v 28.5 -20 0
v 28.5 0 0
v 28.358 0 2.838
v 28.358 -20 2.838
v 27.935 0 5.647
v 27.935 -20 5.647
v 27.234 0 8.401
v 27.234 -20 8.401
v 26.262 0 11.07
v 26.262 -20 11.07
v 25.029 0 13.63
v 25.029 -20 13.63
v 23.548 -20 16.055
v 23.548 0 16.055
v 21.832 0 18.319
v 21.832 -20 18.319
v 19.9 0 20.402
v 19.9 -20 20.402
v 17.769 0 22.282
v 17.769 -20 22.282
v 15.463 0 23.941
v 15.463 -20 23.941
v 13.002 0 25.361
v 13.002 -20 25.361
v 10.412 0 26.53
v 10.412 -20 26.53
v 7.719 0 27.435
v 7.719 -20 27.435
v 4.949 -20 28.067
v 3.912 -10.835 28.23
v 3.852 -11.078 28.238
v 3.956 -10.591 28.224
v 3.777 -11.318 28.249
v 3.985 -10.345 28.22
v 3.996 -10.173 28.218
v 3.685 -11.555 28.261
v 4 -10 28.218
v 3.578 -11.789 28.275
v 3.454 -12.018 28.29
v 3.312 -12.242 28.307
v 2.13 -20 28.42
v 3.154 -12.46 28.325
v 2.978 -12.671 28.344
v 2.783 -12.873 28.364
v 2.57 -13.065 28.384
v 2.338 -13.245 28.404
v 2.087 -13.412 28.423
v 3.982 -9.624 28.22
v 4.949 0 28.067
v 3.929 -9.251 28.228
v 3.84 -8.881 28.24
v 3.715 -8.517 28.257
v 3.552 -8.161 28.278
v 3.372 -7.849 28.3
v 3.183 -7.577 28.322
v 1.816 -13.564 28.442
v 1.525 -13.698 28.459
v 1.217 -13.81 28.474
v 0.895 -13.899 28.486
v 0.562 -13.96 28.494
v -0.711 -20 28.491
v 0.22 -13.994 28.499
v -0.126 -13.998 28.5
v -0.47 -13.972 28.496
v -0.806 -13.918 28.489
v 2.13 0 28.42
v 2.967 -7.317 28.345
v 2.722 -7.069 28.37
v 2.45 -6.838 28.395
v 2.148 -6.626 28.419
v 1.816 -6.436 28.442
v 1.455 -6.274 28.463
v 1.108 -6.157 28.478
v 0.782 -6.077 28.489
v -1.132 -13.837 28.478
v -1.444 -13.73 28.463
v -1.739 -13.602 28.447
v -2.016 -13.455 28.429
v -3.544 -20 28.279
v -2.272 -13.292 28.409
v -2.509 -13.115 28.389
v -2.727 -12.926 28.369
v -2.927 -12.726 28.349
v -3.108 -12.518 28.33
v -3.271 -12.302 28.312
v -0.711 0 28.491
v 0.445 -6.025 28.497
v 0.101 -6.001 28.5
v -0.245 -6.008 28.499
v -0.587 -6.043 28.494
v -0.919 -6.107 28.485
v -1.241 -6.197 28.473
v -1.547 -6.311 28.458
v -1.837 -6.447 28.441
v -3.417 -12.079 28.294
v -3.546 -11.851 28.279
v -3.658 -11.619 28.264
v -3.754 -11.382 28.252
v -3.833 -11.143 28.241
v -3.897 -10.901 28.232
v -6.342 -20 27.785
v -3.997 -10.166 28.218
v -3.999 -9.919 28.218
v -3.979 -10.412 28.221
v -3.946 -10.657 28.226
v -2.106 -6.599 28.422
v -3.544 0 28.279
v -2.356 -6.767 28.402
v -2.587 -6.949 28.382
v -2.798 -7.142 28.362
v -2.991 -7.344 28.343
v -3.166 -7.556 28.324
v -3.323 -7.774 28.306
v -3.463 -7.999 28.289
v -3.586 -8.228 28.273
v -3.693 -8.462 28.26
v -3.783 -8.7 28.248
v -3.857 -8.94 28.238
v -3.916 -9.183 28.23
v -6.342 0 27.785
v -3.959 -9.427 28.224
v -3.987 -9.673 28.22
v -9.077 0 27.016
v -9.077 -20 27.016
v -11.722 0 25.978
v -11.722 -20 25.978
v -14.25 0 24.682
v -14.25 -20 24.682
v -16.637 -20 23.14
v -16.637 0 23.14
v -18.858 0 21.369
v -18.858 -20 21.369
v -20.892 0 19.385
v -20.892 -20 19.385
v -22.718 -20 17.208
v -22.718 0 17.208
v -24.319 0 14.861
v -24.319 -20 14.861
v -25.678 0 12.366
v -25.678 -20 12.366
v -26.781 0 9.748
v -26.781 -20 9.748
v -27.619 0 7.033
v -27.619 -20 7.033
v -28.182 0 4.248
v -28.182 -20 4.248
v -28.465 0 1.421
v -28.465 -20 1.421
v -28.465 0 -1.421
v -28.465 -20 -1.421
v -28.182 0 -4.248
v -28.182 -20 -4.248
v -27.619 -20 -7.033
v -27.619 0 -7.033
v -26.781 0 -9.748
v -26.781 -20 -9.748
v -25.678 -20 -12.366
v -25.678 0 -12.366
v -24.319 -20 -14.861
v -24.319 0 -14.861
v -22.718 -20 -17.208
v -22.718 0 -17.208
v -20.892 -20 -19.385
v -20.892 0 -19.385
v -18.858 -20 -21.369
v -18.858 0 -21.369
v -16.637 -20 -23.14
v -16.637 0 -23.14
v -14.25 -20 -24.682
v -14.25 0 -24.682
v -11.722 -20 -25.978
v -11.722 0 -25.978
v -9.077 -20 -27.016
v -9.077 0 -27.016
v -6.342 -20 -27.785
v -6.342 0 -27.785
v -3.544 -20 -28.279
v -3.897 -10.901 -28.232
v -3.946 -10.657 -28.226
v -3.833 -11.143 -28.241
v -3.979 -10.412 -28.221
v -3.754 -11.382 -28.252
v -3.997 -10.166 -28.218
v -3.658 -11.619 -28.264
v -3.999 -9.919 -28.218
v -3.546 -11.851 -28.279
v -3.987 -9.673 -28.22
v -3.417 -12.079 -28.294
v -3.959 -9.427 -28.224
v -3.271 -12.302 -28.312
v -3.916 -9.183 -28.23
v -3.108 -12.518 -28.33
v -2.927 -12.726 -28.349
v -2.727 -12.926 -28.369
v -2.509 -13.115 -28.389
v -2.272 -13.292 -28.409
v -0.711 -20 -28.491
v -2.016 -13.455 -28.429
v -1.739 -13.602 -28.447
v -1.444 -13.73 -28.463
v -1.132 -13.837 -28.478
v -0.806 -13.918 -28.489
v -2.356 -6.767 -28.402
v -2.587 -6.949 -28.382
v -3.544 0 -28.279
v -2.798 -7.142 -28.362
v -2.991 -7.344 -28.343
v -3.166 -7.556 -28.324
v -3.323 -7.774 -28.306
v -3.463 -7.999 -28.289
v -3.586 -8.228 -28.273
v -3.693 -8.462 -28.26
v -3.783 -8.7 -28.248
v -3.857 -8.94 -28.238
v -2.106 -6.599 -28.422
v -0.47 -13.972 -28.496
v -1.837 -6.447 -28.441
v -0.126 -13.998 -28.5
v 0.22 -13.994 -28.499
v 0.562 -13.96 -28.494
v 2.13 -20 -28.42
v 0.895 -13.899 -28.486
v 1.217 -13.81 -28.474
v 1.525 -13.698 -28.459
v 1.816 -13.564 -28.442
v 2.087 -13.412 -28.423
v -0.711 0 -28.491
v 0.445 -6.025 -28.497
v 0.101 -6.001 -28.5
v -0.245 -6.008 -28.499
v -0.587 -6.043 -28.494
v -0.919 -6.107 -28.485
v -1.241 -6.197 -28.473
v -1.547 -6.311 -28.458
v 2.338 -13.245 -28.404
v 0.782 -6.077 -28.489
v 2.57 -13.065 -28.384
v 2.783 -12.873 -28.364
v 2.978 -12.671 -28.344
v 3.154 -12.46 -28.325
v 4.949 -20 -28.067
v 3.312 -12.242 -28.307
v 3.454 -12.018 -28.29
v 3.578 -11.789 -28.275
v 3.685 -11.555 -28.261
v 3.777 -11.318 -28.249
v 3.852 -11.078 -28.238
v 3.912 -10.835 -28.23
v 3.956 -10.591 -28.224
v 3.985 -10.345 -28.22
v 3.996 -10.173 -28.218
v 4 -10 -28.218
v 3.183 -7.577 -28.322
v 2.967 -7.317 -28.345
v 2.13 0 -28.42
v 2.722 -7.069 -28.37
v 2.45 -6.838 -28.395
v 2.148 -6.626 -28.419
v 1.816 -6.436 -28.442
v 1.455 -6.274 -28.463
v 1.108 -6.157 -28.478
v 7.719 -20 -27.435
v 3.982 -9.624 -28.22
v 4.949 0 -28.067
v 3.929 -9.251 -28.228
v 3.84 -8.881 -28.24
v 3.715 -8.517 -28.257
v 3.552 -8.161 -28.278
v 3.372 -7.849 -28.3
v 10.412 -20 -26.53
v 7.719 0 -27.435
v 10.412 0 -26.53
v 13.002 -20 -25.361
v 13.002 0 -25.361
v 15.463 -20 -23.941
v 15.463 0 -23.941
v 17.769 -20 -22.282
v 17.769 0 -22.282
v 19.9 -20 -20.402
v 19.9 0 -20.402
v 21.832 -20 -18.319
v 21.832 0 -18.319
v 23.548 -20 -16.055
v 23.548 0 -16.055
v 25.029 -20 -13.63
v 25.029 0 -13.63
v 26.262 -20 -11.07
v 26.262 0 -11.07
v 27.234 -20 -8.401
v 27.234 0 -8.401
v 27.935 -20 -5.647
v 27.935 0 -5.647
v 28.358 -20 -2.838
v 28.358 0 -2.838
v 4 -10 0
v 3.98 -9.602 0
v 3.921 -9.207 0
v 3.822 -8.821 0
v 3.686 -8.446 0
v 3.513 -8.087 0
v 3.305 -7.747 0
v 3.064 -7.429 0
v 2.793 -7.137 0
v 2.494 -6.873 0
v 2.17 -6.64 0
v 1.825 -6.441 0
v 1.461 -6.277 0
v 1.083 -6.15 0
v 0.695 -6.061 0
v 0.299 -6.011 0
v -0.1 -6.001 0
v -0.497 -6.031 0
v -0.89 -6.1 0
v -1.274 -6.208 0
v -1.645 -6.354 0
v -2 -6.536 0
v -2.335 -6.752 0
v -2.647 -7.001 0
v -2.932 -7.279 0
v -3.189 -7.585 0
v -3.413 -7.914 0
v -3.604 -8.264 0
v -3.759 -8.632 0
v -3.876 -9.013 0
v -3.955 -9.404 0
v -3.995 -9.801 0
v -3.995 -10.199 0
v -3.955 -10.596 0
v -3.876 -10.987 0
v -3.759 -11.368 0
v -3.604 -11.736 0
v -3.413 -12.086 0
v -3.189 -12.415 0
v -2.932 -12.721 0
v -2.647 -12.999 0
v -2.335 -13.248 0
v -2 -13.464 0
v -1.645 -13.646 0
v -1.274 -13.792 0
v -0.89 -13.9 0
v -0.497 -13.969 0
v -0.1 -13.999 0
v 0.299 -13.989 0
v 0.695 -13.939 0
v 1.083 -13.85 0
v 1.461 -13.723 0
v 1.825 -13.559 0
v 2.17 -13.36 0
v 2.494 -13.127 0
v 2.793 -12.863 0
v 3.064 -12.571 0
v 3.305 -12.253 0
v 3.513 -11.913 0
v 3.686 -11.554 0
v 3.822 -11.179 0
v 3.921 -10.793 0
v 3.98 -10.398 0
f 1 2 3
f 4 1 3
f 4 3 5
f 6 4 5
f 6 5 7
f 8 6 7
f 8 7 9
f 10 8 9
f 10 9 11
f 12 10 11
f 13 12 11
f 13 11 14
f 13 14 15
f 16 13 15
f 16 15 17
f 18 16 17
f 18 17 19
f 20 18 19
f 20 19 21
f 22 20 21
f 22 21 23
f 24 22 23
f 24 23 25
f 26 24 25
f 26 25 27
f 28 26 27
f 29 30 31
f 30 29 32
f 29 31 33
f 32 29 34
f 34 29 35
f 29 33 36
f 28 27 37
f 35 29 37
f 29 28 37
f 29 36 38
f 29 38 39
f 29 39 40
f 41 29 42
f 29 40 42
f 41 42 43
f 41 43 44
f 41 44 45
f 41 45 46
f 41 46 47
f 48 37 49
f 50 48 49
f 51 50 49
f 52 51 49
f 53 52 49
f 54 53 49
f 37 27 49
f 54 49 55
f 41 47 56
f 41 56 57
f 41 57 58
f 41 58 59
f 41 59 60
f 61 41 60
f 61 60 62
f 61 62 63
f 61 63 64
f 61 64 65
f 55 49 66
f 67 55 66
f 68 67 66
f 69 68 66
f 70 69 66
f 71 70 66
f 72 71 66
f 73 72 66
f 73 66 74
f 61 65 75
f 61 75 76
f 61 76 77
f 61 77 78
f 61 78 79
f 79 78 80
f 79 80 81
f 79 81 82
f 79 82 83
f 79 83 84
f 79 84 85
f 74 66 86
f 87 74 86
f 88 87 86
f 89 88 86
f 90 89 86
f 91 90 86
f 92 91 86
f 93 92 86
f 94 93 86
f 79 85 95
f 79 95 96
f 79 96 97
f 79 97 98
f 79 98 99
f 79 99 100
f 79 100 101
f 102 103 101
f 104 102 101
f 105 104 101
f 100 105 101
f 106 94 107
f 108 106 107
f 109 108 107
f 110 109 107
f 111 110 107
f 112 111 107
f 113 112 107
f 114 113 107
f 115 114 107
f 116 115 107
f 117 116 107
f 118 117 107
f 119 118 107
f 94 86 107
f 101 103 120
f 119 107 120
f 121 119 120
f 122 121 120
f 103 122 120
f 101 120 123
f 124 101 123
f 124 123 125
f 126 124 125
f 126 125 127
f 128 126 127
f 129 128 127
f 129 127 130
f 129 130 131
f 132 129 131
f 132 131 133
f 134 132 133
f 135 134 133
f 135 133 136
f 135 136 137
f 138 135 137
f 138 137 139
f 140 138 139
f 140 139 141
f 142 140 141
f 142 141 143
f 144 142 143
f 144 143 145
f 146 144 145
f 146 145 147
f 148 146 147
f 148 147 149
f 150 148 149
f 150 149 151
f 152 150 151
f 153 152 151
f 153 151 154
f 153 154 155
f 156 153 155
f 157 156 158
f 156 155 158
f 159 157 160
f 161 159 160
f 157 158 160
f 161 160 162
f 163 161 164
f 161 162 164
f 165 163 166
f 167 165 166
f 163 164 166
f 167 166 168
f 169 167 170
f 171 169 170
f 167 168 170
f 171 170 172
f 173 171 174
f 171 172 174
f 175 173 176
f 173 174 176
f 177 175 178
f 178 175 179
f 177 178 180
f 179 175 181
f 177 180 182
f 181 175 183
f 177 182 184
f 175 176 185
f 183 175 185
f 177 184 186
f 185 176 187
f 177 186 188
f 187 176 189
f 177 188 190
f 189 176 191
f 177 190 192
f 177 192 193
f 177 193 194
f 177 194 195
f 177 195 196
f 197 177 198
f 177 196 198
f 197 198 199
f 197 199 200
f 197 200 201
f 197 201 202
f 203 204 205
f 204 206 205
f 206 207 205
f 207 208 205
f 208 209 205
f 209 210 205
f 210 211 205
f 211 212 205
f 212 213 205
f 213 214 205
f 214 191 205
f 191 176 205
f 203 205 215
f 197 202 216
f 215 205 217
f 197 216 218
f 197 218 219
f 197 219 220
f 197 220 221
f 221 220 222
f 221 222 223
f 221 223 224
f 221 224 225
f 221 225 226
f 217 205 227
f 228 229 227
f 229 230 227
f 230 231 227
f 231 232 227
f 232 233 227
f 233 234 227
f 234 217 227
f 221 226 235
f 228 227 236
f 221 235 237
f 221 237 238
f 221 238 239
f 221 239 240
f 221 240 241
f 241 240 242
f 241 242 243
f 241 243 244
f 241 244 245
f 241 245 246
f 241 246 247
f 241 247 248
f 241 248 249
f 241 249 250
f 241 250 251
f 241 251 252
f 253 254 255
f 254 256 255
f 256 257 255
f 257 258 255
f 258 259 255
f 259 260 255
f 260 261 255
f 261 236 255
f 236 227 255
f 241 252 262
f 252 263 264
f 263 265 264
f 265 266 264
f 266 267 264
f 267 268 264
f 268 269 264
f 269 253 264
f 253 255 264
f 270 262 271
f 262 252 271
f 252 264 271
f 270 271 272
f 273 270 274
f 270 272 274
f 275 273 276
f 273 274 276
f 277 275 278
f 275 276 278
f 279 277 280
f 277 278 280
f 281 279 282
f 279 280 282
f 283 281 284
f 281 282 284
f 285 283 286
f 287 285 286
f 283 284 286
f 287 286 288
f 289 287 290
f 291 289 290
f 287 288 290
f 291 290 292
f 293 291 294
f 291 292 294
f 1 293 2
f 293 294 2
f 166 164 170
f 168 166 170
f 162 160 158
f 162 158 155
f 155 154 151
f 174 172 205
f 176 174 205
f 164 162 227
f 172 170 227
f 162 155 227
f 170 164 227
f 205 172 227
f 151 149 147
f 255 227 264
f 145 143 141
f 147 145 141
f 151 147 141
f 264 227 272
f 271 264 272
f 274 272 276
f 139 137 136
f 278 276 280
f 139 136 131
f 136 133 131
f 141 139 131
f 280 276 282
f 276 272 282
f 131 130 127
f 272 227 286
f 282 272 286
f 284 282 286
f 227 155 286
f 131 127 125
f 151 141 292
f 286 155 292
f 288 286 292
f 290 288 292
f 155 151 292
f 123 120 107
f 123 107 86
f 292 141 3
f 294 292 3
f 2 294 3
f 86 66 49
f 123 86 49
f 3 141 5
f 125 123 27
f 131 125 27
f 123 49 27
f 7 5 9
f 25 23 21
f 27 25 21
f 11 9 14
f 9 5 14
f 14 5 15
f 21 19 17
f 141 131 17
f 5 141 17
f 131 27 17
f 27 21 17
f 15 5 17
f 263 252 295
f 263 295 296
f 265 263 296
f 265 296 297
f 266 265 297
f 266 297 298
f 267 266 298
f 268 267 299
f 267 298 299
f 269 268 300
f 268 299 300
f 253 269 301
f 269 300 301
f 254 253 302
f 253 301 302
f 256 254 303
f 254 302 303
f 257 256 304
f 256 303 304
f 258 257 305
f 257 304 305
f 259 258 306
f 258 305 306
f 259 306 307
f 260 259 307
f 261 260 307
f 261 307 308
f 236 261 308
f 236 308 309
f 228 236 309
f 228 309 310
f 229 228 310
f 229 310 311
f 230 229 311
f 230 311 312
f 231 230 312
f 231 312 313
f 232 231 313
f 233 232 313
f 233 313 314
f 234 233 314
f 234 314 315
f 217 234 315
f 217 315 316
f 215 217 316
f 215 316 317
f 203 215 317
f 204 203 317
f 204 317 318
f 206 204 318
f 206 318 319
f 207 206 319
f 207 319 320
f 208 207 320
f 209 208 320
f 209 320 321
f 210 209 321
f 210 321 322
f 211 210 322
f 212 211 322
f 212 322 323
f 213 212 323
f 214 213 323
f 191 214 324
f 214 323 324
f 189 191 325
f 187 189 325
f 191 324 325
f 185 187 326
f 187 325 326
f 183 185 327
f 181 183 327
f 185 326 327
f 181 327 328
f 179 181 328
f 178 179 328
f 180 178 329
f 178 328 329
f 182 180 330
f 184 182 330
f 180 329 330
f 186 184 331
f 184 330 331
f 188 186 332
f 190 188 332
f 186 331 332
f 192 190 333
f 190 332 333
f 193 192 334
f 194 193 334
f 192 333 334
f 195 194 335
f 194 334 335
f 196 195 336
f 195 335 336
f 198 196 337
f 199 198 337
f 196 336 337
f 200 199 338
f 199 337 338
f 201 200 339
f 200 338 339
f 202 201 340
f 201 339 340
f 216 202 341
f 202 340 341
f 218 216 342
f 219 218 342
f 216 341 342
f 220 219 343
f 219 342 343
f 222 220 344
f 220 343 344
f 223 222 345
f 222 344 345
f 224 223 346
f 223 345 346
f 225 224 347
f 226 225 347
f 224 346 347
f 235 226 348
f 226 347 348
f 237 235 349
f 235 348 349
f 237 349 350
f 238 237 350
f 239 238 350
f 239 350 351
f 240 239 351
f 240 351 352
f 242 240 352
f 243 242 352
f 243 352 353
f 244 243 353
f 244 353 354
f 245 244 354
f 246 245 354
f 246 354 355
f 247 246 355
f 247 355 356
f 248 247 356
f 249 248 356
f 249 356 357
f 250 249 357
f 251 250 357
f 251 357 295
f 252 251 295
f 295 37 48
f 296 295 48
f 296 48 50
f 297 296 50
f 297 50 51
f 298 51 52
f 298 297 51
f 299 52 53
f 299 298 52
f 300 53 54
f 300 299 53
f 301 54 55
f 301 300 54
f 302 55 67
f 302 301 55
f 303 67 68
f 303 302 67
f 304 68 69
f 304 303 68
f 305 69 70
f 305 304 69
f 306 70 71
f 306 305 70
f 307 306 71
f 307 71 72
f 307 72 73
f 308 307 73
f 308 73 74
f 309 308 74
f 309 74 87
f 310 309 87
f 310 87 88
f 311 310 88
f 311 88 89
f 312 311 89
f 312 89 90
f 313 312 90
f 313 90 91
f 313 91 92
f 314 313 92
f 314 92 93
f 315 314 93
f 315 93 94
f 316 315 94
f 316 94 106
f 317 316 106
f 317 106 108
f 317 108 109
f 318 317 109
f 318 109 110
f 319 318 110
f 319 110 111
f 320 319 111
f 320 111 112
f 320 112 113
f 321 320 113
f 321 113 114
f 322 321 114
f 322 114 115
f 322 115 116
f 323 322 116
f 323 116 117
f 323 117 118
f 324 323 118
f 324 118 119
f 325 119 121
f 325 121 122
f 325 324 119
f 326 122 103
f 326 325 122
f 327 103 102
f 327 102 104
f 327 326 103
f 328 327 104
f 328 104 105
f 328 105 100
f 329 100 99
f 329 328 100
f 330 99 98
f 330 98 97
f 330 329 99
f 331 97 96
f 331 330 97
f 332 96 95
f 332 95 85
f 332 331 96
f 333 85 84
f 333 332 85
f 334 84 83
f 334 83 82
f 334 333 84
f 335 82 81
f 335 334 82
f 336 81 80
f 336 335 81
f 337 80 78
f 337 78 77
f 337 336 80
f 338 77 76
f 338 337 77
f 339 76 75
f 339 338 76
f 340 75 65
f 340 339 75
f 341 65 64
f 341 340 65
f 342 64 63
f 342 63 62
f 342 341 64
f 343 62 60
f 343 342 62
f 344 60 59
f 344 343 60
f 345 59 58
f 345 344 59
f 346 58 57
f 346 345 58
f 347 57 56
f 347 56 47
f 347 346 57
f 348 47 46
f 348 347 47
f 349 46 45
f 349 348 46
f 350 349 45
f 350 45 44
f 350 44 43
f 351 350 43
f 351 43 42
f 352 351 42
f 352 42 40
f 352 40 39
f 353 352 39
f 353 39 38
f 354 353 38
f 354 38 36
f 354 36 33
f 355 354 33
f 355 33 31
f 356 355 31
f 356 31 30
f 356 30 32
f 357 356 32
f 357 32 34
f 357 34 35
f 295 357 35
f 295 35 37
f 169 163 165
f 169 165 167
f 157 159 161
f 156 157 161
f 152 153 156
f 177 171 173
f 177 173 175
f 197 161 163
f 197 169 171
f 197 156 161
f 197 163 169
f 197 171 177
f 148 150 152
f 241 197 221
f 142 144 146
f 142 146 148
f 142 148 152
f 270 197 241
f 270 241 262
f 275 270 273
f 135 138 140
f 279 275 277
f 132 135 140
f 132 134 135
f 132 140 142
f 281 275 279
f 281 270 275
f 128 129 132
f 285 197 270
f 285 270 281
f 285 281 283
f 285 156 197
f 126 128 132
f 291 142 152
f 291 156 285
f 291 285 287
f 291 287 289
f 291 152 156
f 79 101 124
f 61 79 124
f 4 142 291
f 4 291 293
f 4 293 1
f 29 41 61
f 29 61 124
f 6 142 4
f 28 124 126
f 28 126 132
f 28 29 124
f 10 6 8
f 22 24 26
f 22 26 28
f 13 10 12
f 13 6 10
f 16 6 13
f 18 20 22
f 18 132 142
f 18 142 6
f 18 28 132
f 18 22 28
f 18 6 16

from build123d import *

# Parameters (mm, degrees)
F0_R     = 28.5
F1_DEPTH = 20
F2_R     = 4
F3_DEPTH = 28.501
F4_DEPTH = 28.501


with BuildPart() as f1:
    # F0 (on Front) → F1 (new body)
    with BuildSketch(Plane.XZ):
        Circle(F0_R)
    extrude(amount=F1_DEPTH)

    # F2 (on Top) → F3 (cut, through all)
    with BuildSketch(Plane.XY):
        with Locations((0, -10)):
            Circle(F2_R)
    extrude(amount=-F3_DEPTH, mode=Mode.SUBTRACT)

    # F2 (on Top) → F4 (cut, through all)
    with BuildSketch(Plane.XY):
        with Locations((0, -10)):
            Circle(F2_R)
    extrude(amount=F4_DEPTH, mode=Mode.SUBTRACT)


solid = f1.part
